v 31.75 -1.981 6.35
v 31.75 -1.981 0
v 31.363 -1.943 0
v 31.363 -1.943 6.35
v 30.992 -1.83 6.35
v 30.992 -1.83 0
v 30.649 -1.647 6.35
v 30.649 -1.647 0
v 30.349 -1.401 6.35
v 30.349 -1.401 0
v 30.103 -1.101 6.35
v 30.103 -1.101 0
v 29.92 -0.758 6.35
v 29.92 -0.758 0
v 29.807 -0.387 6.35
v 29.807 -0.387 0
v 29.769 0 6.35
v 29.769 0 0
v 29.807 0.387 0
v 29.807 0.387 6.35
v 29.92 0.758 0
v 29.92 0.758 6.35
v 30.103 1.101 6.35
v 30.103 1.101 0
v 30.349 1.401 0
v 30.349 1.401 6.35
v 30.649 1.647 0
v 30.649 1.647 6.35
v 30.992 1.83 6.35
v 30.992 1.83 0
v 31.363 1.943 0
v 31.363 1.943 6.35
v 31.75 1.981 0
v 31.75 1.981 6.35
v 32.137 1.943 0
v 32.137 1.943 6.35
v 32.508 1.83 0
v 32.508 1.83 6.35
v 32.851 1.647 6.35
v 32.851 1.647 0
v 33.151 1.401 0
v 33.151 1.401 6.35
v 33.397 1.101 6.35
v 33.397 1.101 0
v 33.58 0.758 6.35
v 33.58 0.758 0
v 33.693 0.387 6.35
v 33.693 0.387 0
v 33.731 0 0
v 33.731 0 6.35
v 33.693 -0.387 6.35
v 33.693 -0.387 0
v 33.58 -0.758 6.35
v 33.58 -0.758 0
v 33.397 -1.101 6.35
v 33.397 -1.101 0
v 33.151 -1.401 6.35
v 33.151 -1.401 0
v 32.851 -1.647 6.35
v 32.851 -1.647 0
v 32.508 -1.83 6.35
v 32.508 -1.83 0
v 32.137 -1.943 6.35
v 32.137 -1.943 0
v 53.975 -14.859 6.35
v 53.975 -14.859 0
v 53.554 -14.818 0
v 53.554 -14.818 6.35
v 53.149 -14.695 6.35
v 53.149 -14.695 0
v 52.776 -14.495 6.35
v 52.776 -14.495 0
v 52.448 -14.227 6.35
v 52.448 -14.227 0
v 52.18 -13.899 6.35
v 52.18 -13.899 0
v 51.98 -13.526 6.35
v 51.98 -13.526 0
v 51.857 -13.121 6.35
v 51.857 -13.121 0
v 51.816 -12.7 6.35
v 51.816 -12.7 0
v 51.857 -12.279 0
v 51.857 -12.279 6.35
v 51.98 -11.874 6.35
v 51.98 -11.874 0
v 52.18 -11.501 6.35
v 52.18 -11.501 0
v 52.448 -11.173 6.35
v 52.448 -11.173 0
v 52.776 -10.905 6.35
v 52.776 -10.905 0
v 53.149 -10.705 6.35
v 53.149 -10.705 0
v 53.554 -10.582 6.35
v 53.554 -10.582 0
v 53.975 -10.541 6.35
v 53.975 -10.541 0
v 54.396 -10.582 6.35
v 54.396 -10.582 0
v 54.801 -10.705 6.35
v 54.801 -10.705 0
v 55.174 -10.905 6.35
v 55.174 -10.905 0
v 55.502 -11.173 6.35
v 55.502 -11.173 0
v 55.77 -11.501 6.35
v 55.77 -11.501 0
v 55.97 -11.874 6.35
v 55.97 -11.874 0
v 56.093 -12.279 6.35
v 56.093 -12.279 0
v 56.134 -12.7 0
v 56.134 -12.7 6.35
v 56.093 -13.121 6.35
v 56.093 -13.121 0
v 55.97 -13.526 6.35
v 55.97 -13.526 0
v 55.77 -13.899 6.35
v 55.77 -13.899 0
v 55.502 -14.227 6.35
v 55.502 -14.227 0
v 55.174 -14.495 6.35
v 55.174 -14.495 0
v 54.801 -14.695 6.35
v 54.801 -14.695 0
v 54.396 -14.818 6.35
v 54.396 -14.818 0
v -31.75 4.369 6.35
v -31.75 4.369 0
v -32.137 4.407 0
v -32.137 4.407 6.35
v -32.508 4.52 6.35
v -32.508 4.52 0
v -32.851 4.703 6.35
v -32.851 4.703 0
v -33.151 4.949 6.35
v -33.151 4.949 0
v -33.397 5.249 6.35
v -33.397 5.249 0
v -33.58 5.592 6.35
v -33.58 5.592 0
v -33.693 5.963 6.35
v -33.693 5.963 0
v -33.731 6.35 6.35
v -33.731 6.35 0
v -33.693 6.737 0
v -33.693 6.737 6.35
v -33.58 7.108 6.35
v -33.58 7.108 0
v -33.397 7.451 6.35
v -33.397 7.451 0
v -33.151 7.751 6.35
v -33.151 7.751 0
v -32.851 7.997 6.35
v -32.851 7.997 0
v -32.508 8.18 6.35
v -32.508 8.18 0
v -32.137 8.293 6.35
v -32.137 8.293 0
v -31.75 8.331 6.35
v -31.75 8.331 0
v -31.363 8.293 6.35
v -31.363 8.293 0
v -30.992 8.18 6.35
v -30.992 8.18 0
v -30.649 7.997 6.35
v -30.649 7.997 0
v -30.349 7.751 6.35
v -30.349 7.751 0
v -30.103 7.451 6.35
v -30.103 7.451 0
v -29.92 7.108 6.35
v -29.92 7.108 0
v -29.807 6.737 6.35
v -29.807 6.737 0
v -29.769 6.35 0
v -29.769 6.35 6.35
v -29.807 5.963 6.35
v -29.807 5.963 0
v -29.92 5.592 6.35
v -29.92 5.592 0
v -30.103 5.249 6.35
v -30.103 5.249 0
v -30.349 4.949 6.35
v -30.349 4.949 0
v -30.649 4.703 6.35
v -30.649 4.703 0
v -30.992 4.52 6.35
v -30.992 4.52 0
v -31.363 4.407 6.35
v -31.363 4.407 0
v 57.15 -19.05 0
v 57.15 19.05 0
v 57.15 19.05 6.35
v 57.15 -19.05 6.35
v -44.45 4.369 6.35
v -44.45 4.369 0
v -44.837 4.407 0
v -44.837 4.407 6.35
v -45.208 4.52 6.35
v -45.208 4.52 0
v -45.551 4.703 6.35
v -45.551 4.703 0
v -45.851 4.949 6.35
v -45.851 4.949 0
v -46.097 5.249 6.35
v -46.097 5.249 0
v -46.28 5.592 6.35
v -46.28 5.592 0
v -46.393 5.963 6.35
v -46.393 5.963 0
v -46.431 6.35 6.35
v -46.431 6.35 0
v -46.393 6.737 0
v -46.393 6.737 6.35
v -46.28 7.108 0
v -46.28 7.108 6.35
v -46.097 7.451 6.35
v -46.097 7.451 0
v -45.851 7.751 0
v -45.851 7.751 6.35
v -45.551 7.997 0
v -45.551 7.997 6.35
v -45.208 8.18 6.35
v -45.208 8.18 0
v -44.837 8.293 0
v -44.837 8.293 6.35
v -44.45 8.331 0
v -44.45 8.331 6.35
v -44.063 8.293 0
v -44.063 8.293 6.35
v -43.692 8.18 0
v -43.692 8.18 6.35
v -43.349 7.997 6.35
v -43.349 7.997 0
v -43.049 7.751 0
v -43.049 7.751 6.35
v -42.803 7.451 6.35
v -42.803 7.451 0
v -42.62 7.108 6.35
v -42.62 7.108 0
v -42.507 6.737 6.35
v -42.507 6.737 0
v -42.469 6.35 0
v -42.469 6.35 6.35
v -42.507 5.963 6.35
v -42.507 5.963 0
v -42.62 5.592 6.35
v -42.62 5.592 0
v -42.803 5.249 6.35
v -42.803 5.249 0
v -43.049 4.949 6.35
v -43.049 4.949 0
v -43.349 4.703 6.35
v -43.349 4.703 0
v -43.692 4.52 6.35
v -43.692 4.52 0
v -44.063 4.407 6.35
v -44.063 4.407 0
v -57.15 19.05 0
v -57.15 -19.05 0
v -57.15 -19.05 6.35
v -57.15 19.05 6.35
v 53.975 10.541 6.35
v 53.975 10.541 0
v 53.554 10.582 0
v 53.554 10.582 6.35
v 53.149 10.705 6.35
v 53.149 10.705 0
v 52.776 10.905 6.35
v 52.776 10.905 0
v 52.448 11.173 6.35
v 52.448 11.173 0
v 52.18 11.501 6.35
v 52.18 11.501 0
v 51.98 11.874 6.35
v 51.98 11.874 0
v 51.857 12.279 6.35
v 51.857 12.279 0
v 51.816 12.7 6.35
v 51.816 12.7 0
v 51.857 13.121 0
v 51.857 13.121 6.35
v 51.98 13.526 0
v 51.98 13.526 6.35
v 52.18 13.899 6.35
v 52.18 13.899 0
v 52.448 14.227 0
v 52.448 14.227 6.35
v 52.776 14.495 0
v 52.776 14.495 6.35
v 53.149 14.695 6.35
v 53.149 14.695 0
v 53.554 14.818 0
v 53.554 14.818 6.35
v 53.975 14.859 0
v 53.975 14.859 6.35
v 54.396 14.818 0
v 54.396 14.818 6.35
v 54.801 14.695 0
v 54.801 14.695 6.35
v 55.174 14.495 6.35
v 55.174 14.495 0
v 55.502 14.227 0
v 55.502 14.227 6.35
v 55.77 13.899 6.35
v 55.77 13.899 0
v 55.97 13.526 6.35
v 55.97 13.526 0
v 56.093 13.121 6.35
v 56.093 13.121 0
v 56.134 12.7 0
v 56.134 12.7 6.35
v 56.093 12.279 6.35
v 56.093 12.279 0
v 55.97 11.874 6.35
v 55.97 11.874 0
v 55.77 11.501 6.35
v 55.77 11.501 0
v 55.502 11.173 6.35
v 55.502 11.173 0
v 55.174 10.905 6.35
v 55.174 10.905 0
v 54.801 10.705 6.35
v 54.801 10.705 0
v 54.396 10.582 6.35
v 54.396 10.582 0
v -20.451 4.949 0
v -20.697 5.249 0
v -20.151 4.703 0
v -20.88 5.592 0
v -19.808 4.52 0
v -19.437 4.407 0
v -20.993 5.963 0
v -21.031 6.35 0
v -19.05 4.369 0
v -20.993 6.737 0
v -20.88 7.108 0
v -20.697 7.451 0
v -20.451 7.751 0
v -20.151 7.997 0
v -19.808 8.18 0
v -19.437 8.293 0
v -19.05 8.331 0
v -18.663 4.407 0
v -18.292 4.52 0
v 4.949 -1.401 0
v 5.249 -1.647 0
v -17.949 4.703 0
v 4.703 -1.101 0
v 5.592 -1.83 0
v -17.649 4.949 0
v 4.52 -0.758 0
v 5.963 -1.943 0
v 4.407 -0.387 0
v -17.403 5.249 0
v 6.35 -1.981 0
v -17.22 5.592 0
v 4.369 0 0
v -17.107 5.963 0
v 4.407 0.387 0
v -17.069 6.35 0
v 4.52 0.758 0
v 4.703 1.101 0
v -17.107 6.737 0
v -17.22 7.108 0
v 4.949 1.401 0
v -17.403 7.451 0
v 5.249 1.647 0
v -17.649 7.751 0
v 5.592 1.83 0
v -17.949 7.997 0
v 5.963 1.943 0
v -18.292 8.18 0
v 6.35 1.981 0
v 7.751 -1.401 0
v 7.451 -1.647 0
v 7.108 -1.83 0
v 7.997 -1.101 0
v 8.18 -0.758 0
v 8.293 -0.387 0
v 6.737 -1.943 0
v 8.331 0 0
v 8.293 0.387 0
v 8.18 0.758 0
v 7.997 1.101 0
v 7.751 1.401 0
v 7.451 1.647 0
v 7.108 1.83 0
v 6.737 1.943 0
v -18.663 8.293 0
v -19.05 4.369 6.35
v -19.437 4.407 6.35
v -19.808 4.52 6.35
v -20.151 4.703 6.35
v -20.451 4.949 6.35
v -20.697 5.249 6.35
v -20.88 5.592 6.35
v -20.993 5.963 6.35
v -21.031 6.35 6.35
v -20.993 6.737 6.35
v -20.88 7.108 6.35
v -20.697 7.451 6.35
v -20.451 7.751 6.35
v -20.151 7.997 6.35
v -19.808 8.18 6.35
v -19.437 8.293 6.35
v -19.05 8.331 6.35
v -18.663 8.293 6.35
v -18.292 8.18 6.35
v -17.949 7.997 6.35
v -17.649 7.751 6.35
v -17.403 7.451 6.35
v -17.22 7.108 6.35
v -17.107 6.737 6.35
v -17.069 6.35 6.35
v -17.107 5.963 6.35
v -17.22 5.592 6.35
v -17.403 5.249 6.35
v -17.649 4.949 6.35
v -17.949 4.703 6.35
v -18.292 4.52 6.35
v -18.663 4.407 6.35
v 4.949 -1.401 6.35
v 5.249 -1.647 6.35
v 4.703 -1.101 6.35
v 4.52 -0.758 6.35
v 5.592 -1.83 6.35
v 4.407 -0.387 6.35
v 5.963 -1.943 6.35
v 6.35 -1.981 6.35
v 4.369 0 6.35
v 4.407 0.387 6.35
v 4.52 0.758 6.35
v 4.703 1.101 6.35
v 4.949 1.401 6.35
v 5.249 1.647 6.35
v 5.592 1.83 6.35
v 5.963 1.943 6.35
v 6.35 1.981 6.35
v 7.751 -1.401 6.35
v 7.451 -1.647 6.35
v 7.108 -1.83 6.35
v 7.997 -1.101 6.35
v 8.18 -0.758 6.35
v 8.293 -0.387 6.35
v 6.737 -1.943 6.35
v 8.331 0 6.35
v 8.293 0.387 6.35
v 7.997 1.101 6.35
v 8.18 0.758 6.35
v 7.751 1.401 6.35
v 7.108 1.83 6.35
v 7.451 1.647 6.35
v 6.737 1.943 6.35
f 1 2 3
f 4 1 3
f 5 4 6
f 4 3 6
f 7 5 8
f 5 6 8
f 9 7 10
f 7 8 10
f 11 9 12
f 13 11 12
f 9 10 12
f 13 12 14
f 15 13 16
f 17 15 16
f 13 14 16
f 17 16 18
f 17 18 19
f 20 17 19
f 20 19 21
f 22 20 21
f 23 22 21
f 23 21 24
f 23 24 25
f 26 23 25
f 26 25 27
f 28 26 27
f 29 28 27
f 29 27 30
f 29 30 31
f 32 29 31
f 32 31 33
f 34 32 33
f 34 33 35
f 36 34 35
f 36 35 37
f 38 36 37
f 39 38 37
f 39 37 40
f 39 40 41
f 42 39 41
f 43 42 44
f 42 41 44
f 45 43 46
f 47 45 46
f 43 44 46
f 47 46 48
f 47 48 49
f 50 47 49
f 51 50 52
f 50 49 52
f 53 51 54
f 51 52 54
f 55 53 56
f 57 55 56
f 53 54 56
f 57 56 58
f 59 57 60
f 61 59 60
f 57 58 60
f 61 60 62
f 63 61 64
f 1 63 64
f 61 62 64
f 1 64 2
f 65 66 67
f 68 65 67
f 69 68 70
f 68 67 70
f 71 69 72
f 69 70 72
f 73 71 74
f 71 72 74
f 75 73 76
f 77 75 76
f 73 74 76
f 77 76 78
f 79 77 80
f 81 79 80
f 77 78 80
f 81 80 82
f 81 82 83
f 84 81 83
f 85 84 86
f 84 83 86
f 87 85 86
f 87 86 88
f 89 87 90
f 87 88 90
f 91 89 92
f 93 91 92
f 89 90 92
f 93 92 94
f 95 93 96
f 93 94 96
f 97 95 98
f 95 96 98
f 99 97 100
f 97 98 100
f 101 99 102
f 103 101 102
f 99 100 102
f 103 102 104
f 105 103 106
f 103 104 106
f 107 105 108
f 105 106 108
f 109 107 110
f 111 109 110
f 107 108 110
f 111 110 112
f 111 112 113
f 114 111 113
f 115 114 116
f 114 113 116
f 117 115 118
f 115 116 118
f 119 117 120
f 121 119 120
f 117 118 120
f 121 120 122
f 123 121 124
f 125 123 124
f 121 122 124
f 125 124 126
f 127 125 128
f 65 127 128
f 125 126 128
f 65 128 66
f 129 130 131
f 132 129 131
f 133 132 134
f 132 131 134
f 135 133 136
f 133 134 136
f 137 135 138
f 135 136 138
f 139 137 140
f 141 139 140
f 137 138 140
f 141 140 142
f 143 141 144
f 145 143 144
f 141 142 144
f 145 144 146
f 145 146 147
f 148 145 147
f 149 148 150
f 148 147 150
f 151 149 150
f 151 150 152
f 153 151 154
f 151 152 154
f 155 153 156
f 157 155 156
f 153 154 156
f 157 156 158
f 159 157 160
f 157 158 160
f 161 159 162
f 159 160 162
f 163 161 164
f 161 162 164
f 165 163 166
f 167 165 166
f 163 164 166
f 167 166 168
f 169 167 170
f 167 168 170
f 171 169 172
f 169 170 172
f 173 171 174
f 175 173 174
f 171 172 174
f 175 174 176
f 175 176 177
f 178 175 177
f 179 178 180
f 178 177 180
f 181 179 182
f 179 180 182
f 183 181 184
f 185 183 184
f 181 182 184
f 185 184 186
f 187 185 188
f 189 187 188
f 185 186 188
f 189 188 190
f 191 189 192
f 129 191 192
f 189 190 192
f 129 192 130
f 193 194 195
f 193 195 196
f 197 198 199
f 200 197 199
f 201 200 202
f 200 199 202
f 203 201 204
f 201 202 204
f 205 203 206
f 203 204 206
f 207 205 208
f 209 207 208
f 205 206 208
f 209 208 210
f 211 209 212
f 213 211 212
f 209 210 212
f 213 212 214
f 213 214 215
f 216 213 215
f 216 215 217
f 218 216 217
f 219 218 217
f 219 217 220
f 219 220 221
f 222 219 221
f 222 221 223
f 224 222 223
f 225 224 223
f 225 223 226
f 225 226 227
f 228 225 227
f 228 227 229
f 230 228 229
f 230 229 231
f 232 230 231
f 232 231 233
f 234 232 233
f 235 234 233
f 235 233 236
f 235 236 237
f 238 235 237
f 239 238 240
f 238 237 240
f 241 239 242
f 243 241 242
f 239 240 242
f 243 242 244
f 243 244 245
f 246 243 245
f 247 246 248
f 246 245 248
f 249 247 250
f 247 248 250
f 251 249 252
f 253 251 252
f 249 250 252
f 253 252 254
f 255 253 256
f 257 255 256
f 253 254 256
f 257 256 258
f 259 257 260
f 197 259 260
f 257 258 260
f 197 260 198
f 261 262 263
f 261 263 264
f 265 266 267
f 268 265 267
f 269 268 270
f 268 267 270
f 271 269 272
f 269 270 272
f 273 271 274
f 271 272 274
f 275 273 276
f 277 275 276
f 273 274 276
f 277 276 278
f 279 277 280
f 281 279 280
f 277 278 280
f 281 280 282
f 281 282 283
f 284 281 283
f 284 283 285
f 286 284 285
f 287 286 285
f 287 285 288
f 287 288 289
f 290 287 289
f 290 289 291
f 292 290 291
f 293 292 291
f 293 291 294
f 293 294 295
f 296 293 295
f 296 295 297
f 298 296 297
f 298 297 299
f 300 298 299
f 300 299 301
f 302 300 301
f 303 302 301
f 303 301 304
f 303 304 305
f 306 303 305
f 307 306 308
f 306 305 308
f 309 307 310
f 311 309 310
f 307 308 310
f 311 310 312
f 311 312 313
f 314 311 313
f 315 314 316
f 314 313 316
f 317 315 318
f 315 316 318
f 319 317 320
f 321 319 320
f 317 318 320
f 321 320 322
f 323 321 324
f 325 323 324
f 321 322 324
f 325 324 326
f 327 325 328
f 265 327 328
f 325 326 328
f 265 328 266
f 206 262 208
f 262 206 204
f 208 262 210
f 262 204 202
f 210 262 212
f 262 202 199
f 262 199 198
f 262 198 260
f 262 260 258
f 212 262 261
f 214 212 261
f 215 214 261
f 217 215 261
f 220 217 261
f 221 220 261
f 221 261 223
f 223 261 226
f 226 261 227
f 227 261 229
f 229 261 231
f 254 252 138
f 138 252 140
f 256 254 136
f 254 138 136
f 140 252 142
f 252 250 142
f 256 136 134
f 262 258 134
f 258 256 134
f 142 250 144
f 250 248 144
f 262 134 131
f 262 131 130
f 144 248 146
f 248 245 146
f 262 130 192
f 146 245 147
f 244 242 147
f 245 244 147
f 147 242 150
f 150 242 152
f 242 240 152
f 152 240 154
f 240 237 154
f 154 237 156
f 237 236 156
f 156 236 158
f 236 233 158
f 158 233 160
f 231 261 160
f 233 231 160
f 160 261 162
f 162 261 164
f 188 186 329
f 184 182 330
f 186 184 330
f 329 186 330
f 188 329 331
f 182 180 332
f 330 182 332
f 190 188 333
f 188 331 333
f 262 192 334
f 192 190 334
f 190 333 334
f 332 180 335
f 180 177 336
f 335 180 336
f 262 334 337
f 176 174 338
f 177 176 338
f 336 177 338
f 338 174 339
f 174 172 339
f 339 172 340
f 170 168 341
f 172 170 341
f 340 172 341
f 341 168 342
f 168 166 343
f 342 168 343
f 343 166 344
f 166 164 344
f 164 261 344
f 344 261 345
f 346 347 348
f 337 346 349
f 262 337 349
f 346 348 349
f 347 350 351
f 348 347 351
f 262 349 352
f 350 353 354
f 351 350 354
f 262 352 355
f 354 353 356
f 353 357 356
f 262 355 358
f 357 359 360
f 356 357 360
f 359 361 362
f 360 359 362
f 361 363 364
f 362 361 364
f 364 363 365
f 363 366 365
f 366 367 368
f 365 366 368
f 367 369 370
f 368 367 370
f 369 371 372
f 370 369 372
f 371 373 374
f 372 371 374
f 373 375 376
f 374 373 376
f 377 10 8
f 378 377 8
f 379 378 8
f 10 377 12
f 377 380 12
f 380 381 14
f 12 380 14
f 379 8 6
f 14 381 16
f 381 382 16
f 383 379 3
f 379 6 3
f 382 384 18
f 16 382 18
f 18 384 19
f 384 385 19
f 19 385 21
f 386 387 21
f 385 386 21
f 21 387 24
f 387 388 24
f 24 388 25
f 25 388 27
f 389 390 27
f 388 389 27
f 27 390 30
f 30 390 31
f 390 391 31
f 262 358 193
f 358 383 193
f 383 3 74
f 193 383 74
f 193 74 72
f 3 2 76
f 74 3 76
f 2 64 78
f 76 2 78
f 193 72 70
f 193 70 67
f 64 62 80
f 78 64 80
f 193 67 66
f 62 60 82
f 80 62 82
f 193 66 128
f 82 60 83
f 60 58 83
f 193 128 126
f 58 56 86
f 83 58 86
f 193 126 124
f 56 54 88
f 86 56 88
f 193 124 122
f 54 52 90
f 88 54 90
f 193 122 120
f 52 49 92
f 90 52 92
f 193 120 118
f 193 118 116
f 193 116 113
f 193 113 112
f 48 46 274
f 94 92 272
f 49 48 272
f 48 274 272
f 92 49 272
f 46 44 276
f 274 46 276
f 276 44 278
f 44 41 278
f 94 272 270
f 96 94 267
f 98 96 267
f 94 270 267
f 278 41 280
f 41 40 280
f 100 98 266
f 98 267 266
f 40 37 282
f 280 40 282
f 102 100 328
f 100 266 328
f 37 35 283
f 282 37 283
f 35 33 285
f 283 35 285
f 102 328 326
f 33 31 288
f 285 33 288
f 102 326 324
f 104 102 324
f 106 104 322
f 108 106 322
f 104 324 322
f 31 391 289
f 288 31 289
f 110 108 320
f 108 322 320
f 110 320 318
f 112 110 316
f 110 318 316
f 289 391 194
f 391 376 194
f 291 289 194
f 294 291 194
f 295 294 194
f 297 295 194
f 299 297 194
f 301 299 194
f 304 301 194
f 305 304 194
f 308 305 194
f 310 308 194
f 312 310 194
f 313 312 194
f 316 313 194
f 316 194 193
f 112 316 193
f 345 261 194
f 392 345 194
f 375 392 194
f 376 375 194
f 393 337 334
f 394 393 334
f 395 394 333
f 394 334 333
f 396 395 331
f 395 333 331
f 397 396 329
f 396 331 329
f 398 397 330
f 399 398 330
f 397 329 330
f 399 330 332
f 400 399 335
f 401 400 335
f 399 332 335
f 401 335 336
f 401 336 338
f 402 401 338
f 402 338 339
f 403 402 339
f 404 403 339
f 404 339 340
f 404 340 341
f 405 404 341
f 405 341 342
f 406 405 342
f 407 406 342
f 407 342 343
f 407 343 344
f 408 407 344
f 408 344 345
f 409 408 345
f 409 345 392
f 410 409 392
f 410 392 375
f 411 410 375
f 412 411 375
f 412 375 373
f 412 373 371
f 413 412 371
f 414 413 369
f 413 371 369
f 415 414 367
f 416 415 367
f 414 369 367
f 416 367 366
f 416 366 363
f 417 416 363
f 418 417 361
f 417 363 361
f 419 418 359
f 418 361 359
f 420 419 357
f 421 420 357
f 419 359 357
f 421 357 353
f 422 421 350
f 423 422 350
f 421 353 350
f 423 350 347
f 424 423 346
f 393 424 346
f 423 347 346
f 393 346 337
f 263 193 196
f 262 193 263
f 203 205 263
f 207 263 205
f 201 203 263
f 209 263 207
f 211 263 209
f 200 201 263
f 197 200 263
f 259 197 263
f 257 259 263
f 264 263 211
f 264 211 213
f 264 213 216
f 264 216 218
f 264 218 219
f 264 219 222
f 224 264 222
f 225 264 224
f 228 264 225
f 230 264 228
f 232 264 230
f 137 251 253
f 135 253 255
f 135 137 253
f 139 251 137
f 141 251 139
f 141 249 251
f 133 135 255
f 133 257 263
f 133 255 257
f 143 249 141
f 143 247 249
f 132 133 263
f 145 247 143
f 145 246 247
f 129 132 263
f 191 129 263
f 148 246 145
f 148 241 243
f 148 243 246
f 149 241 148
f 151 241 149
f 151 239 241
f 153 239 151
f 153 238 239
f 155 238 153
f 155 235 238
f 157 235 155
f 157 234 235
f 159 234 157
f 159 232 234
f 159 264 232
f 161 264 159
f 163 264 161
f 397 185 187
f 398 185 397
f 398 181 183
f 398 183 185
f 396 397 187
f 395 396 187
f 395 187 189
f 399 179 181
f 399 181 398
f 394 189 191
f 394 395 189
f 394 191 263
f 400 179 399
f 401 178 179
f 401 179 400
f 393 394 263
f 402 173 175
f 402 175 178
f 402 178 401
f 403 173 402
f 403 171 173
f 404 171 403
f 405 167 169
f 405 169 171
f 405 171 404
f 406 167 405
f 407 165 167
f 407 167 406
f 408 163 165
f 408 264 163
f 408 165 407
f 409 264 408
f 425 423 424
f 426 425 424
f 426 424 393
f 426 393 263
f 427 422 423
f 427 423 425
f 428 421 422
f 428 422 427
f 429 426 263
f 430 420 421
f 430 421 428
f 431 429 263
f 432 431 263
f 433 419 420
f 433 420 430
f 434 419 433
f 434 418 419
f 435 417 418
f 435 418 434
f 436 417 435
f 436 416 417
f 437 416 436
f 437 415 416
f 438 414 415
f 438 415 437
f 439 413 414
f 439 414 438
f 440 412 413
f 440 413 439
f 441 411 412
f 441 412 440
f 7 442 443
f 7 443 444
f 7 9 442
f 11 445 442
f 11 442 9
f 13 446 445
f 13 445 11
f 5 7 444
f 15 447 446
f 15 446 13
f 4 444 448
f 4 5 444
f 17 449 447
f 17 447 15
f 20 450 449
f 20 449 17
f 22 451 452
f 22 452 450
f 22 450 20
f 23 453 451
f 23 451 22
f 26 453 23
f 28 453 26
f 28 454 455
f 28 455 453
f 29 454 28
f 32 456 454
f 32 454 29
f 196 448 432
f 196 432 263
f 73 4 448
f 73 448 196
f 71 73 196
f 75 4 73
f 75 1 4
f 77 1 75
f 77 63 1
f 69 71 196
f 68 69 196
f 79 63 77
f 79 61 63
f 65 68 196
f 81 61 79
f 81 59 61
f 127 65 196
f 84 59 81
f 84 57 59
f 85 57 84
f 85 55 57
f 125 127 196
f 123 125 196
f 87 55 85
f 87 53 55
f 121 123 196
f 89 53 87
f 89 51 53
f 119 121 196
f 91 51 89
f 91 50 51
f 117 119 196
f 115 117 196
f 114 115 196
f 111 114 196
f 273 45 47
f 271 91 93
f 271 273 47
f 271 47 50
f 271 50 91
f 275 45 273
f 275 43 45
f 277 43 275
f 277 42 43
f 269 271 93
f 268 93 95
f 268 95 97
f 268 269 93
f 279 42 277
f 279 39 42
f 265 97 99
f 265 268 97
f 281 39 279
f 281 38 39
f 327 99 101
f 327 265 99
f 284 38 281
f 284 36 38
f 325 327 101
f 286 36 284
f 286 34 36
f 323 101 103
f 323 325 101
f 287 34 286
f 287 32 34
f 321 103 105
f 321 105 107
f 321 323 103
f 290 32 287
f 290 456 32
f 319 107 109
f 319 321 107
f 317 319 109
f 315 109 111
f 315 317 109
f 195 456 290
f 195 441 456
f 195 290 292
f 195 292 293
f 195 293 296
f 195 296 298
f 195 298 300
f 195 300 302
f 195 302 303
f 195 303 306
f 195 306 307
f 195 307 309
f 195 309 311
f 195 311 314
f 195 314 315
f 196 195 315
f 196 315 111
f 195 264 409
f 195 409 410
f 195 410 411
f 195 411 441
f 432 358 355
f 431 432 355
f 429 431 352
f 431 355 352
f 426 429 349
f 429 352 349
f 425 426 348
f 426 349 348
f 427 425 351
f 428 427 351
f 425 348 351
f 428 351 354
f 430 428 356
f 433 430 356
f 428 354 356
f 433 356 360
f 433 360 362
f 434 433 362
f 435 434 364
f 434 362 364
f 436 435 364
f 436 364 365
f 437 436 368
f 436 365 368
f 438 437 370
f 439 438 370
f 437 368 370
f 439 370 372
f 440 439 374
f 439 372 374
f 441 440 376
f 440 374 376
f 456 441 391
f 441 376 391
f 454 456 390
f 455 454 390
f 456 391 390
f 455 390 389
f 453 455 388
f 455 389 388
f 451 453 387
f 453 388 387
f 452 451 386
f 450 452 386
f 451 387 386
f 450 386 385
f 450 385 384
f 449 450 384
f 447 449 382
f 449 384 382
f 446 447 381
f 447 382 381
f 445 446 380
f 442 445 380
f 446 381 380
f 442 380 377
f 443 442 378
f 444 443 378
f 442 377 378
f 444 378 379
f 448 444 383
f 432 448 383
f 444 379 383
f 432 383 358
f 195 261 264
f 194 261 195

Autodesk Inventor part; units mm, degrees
ref_plane "YZ Plane" through (0, 0, 0) normal (1, 0, 0) x (0, 1, 0)
ref_plane "XZ Plane" through (0, 0, 0) normal (0, 1, 0) x (-1, 0, 0)
ref_plane "XY Plane" through (0, 0, 0) normal (0, 0, 1) x (1, 0, 0)
sketch "Sketch1" plane through (0, 0, 0) normal (0, 0, 1) x (1, 0, 0)
  line L0 (57.15, -19.05) -> (-57.15, -19.05)
  line L1 (-57.15, -19.05) -> (-57.15, 19.05)
  line L2 (-57.15, 19.05) -> (57.15, 19.05)
  line L3 (57.15, 19.05) -> (57.15, -19.05)
  line L4 (57.15, -19.05) -> (-57.15, 19.05) construction
  line L5 (-57.15, -19.05) -> (57.15, 19.05) construction
  point P0 (0, 0)
  dimension "d0" = 114.3
  dimension "d1" = 38.1
extrude "Extrusion1" add sketch "Sketch1" along normal blind 6.35
sketch "Sketch2" plane through (0, 0, 6.35) normal (0, 0, 1) x (1, 0, 0)
  line L0 (-57.15, 19.05) -> (-57.15, -19.05) projected
  line L1 (57.15, 19.05) -> (-57.15, 19.05) projected
  point P0 (0, 0)
  point P1 (-44.45, 6.35)
  point P2 (-31.75, 6.35)
  point P3 (-19.05, 6.35)
  point P4 (-57.15, 0)
  dimension "d5" = 12.7
  dimension "d6" = 12.7
  dimension "d14" = 12.7
  dimension "d15" = 12.7
hole "Hole1" at (-44.45, 6.35, 6.35) at (-31.75, 6.35, 6.35) at (-19.05, 6.35, 6.35) direction (0, 0, -1) diameter 3.9624 end through all thread size "10-32 UNF" class "2B" standard "ANSI Unified Screw Threads"
sketch "Sketch3" plane through (0, 0, 6.35) normal (0, 0, 1) x (1, 0, 0)
  line L0 (57.15, 19.05) -> (-57.15, 19.05) projected
  line L1 (-57.15, -19.05) -> (57.15, -19.05) projected
  line L2 (57.15, -19.05) -> (57.15, 19.05) projected
  point P0 (0, 0)
  point P1 (53.975, 12.7)
  point P2 (53.975, -12.7)
  dimension "d16" = 6.35
  dimension "d17" = 6.35
  dimension "d18" = 3.175
hole "Hole2" at (53.975, 12.7, 6.35) at (53.975, -12.7, 6.35) direction (0, 0, -1) diameter 4.318 end through all clearance for "Flat Head Machine Screw (82)" size "#8" standard "Ansi Unified Screw Threads"
sketch "Sketch5" plane through (0, 0, 6.35) normal (0, 0, 1) x (1, 0, 0)
  line L0 (57.15, -19.05) -> (57.15, 19.05) construction
  line L1 (6.35, 0) -> (31.75, 0) construction
  point P0 (0, 0)
  point P1 (57.15, 0)
  point P2 (19.05, 0)
  dimension "d28" = 25.4
  dimension "d37" = 38.1
hole "Hole3" at (6.35, 0, 6.35) at (31.75, 0, 6.35) direction (0, 0, -1) diameter 3.9624 end through all thread size "10-32 UNF" class "2B" standard "ANSI Unified Screw Threads"
equation "\"d5\" = d4"
equation "\"d6\" = d4"
equation "\"d4\" = 12.7"
properties part number "EL2-014" material "Aluminum 6061"
